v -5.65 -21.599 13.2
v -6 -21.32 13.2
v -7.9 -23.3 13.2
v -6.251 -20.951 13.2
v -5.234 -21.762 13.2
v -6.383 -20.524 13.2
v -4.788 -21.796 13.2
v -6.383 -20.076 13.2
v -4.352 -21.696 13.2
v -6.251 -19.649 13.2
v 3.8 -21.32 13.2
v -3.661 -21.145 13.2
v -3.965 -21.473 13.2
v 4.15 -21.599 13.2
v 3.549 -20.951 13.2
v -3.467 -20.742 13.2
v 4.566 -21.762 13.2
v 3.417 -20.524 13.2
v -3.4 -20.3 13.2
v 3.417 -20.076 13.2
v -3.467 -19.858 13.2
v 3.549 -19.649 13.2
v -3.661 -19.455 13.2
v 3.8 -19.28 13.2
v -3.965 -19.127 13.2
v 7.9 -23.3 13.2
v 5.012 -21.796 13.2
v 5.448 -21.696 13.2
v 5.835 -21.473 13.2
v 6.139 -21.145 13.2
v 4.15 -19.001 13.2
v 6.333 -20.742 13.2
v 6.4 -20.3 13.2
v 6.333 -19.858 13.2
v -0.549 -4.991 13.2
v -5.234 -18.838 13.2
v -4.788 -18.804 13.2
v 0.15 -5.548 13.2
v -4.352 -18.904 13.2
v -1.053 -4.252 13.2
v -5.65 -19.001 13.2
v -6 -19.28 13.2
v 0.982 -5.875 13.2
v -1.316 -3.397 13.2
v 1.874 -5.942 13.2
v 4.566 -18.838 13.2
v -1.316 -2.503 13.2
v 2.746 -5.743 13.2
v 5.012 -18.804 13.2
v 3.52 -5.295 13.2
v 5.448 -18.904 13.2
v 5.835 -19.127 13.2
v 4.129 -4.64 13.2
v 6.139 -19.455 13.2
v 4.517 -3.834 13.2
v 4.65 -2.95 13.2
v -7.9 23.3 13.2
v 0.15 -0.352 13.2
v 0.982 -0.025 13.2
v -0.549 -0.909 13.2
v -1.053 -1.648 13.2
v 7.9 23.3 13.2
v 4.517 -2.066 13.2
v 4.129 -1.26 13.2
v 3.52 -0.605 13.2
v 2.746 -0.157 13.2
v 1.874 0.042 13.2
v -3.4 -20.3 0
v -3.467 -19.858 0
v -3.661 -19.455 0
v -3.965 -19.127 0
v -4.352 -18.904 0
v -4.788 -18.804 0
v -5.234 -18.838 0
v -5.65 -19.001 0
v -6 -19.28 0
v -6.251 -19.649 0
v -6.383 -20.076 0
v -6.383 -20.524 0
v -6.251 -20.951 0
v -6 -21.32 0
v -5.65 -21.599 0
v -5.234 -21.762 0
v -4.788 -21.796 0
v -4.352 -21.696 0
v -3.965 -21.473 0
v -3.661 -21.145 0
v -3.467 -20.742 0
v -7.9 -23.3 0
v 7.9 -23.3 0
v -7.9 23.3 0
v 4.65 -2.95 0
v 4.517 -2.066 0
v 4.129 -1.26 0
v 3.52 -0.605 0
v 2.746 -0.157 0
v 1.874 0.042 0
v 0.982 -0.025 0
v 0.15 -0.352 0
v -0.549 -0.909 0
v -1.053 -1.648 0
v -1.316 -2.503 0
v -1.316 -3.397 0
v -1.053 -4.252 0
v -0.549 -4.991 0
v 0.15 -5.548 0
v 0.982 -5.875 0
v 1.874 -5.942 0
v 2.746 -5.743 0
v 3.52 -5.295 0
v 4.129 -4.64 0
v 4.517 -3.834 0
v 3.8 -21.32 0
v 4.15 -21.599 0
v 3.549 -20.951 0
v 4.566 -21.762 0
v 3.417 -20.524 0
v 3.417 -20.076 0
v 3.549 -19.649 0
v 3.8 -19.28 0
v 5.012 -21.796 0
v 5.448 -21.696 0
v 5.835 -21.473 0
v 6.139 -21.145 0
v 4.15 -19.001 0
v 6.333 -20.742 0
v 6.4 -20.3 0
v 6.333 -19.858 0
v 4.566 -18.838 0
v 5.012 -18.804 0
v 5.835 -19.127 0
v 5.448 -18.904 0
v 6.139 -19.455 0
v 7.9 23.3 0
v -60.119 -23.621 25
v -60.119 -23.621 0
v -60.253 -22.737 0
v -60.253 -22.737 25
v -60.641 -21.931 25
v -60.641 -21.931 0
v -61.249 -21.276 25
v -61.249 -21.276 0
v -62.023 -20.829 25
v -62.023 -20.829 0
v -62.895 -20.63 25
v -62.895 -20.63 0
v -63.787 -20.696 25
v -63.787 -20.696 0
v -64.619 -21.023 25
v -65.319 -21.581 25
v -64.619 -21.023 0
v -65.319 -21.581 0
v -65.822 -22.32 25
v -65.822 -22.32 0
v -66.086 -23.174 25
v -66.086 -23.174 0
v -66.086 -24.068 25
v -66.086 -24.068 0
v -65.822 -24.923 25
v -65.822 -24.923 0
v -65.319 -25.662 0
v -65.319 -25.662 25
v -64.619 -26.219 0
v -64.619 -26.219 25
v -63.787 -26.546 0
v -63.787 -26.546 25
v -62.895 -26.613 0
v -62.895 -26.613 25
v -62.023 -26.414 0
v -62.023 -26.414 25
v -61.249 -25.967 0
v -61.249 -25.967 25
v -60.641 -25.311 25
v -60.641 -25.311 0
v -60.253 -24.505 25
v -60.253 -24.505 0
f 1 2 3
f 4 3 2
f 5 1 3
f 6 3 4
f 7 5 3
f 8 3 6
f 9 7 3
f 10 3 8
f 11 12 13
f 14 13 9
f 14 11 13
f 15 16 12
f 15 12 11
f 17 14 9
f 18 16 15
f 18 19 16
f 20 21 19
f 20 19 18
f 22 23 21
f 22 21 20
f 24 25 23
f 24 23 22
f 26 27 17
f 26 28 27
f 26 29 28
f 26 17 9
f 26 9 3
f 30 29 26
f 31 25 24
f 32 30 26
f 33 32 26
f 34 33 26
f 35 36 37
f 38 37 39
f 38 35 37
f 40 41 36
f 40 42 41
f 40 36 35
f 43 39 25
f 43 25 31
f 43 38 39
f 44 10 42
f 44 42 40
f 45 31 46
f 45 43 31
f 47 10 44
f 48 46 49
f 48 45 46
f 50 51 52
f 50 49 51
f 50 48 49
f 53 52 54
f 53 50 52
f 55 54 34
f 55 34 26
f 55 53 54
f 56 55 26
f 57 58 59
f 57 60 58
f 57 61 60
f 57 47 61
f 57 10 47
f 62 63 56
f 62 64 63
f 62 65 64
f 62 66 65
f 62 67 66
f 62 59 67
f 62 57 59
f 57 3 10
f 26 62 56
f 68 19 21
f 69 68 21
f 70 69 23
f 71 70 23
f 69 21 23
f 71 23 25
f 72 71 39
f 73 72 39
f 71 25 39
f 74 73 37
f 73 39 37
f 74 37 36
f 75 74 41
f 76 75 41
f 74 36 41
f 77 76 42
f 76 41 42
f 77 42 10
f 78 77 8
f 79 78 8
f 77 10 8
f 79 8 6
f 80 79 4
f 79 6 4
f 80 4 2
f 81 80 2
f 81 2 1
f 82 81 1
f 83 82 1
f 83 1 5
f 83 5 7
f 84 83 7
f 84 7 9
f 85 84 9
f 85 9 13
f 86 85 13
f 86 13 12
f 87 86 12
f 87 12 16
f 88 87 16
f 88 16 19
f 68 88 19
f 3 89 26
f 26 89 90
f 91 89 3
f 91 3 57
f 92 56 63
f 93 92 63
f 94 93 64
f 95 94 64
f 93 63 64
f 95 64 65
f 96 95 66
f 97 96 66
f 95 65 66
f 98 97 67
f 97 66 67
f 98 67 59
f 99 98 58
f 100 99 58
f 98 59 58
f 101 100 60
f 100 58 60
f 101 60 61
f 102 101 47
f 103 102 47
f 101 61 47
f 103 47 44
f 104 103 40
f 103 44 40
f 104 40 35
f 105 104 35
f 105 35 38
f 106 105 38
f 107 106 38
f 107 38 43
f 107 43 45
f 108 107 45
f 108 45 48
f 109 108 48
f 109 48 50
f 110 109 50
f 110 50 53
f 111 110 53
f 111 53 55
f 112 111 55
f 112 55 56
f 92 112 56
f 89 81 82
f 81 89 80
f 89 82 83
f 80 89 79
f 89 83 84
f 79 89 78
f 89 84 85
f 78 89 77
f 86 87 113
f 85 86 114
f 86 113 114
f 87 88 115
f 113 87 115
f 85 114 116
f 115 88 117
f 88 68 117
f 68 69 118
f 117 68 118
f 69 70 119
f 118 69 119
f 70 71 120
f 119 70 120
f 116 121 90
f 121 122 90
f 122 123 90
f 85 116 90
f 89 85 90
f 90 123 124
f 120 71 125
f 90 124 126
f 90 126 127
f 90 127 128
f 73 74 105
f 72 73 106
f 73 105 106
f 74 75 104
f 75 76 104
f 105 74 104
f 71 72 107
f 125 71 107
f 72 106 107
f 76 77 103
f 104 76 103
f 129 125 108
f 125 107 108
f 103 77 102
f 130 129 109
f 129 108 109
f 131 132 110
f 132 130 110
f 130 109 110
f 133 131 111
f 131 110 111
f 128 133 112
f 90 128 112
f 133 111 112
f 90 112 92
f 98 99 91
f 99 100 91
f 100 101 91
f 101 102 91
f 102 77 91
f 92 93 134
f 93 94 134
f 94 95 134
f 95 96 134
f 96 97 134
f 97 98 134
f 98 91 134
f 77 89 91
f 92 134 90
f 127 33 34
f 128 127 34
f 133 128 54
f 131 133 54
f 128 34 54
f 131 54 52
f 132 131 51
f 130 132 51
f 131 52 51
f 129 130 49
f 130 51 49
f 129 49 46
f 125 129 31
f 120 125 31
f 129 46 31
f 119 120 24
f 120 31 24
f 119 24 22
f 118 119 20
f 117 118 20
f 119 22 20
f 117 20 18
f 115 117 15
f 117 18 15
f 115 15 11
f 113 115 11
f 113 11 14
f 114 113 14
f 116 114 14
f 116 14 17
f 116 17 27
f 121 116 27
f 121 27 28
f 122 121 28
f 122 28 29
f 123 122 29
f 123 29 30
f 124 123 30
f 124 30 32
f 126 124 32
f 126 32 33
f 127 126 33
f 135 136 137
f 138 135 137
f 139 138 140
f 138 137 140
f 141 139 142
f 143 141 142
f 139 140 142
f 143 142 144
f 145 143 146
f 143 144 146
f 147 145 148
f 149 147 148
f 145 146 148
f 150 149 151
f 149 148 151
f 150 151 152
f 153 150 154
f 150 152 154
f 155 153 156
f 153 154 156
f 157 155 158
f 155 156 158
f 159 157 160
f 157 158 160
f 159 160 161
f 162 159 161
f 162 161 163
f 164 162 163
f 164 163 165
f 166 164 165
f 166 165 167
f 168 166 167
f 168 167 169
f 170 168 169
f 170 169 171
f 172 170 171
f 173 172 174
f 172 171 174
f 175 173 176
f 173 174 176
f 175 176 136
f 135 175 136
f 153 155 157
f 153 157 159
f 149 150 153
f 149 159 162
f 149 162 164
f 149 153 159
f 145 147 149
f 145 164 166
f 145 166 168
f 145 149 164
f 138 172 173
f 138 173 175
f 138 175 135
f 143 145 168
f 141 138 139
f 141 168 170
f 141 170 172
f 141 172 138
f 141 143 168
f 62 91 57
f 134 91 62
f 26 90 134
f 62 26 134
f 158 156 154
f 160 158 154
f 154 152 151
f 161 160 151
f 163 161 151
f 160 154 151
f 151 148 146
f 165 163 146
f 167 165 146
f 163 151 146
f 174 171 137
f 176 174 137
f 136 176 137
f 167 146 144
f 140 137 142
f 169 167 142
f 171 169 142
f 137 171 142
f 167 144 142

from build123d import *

# Parameters (mm, degrees)
F0_W     = 15.8
F0_H     = 46.6
F1_DEPTH = 13.2
F2_R     = 3
F2_R_2   = 1.5
F3_DEPTH = 25
F4_R     = 3
F5_DEPTH = 25


with BuildPart() as f1:
    # F0 (on Top) → F1 (new body)
    with BuildSketch(Plane.XY):
        Rectangle(F0_W, F0_H)
    extrude(amount=F1_DEPTH)

    # F2 (on face) → F3 (cut)
    with BuildSketch(Plane.XY.offset(13.2)):
        with Locations((1.65, -2.95)):
            Circle(F2_R)
        with Locations((-4.9, -20.3)):
            Circle(F2_R_2)
        with Locations((4.9, -20.3)):
            Circle(F2_R_2)
    extrude(amount=-F3_DEPTH, mode=Mode.SUBTRACT)


with BuildPart() as f5:
    # F4 (on Top) → F5 (new body)
    with BuildSketch(Plane.XY):
        with Locations((-63.119434, -23.621172)):
            Circle(F4_R)
    extrude(amount=F5_DEPTH)


solid = Compound([f1.part, f5.part])
